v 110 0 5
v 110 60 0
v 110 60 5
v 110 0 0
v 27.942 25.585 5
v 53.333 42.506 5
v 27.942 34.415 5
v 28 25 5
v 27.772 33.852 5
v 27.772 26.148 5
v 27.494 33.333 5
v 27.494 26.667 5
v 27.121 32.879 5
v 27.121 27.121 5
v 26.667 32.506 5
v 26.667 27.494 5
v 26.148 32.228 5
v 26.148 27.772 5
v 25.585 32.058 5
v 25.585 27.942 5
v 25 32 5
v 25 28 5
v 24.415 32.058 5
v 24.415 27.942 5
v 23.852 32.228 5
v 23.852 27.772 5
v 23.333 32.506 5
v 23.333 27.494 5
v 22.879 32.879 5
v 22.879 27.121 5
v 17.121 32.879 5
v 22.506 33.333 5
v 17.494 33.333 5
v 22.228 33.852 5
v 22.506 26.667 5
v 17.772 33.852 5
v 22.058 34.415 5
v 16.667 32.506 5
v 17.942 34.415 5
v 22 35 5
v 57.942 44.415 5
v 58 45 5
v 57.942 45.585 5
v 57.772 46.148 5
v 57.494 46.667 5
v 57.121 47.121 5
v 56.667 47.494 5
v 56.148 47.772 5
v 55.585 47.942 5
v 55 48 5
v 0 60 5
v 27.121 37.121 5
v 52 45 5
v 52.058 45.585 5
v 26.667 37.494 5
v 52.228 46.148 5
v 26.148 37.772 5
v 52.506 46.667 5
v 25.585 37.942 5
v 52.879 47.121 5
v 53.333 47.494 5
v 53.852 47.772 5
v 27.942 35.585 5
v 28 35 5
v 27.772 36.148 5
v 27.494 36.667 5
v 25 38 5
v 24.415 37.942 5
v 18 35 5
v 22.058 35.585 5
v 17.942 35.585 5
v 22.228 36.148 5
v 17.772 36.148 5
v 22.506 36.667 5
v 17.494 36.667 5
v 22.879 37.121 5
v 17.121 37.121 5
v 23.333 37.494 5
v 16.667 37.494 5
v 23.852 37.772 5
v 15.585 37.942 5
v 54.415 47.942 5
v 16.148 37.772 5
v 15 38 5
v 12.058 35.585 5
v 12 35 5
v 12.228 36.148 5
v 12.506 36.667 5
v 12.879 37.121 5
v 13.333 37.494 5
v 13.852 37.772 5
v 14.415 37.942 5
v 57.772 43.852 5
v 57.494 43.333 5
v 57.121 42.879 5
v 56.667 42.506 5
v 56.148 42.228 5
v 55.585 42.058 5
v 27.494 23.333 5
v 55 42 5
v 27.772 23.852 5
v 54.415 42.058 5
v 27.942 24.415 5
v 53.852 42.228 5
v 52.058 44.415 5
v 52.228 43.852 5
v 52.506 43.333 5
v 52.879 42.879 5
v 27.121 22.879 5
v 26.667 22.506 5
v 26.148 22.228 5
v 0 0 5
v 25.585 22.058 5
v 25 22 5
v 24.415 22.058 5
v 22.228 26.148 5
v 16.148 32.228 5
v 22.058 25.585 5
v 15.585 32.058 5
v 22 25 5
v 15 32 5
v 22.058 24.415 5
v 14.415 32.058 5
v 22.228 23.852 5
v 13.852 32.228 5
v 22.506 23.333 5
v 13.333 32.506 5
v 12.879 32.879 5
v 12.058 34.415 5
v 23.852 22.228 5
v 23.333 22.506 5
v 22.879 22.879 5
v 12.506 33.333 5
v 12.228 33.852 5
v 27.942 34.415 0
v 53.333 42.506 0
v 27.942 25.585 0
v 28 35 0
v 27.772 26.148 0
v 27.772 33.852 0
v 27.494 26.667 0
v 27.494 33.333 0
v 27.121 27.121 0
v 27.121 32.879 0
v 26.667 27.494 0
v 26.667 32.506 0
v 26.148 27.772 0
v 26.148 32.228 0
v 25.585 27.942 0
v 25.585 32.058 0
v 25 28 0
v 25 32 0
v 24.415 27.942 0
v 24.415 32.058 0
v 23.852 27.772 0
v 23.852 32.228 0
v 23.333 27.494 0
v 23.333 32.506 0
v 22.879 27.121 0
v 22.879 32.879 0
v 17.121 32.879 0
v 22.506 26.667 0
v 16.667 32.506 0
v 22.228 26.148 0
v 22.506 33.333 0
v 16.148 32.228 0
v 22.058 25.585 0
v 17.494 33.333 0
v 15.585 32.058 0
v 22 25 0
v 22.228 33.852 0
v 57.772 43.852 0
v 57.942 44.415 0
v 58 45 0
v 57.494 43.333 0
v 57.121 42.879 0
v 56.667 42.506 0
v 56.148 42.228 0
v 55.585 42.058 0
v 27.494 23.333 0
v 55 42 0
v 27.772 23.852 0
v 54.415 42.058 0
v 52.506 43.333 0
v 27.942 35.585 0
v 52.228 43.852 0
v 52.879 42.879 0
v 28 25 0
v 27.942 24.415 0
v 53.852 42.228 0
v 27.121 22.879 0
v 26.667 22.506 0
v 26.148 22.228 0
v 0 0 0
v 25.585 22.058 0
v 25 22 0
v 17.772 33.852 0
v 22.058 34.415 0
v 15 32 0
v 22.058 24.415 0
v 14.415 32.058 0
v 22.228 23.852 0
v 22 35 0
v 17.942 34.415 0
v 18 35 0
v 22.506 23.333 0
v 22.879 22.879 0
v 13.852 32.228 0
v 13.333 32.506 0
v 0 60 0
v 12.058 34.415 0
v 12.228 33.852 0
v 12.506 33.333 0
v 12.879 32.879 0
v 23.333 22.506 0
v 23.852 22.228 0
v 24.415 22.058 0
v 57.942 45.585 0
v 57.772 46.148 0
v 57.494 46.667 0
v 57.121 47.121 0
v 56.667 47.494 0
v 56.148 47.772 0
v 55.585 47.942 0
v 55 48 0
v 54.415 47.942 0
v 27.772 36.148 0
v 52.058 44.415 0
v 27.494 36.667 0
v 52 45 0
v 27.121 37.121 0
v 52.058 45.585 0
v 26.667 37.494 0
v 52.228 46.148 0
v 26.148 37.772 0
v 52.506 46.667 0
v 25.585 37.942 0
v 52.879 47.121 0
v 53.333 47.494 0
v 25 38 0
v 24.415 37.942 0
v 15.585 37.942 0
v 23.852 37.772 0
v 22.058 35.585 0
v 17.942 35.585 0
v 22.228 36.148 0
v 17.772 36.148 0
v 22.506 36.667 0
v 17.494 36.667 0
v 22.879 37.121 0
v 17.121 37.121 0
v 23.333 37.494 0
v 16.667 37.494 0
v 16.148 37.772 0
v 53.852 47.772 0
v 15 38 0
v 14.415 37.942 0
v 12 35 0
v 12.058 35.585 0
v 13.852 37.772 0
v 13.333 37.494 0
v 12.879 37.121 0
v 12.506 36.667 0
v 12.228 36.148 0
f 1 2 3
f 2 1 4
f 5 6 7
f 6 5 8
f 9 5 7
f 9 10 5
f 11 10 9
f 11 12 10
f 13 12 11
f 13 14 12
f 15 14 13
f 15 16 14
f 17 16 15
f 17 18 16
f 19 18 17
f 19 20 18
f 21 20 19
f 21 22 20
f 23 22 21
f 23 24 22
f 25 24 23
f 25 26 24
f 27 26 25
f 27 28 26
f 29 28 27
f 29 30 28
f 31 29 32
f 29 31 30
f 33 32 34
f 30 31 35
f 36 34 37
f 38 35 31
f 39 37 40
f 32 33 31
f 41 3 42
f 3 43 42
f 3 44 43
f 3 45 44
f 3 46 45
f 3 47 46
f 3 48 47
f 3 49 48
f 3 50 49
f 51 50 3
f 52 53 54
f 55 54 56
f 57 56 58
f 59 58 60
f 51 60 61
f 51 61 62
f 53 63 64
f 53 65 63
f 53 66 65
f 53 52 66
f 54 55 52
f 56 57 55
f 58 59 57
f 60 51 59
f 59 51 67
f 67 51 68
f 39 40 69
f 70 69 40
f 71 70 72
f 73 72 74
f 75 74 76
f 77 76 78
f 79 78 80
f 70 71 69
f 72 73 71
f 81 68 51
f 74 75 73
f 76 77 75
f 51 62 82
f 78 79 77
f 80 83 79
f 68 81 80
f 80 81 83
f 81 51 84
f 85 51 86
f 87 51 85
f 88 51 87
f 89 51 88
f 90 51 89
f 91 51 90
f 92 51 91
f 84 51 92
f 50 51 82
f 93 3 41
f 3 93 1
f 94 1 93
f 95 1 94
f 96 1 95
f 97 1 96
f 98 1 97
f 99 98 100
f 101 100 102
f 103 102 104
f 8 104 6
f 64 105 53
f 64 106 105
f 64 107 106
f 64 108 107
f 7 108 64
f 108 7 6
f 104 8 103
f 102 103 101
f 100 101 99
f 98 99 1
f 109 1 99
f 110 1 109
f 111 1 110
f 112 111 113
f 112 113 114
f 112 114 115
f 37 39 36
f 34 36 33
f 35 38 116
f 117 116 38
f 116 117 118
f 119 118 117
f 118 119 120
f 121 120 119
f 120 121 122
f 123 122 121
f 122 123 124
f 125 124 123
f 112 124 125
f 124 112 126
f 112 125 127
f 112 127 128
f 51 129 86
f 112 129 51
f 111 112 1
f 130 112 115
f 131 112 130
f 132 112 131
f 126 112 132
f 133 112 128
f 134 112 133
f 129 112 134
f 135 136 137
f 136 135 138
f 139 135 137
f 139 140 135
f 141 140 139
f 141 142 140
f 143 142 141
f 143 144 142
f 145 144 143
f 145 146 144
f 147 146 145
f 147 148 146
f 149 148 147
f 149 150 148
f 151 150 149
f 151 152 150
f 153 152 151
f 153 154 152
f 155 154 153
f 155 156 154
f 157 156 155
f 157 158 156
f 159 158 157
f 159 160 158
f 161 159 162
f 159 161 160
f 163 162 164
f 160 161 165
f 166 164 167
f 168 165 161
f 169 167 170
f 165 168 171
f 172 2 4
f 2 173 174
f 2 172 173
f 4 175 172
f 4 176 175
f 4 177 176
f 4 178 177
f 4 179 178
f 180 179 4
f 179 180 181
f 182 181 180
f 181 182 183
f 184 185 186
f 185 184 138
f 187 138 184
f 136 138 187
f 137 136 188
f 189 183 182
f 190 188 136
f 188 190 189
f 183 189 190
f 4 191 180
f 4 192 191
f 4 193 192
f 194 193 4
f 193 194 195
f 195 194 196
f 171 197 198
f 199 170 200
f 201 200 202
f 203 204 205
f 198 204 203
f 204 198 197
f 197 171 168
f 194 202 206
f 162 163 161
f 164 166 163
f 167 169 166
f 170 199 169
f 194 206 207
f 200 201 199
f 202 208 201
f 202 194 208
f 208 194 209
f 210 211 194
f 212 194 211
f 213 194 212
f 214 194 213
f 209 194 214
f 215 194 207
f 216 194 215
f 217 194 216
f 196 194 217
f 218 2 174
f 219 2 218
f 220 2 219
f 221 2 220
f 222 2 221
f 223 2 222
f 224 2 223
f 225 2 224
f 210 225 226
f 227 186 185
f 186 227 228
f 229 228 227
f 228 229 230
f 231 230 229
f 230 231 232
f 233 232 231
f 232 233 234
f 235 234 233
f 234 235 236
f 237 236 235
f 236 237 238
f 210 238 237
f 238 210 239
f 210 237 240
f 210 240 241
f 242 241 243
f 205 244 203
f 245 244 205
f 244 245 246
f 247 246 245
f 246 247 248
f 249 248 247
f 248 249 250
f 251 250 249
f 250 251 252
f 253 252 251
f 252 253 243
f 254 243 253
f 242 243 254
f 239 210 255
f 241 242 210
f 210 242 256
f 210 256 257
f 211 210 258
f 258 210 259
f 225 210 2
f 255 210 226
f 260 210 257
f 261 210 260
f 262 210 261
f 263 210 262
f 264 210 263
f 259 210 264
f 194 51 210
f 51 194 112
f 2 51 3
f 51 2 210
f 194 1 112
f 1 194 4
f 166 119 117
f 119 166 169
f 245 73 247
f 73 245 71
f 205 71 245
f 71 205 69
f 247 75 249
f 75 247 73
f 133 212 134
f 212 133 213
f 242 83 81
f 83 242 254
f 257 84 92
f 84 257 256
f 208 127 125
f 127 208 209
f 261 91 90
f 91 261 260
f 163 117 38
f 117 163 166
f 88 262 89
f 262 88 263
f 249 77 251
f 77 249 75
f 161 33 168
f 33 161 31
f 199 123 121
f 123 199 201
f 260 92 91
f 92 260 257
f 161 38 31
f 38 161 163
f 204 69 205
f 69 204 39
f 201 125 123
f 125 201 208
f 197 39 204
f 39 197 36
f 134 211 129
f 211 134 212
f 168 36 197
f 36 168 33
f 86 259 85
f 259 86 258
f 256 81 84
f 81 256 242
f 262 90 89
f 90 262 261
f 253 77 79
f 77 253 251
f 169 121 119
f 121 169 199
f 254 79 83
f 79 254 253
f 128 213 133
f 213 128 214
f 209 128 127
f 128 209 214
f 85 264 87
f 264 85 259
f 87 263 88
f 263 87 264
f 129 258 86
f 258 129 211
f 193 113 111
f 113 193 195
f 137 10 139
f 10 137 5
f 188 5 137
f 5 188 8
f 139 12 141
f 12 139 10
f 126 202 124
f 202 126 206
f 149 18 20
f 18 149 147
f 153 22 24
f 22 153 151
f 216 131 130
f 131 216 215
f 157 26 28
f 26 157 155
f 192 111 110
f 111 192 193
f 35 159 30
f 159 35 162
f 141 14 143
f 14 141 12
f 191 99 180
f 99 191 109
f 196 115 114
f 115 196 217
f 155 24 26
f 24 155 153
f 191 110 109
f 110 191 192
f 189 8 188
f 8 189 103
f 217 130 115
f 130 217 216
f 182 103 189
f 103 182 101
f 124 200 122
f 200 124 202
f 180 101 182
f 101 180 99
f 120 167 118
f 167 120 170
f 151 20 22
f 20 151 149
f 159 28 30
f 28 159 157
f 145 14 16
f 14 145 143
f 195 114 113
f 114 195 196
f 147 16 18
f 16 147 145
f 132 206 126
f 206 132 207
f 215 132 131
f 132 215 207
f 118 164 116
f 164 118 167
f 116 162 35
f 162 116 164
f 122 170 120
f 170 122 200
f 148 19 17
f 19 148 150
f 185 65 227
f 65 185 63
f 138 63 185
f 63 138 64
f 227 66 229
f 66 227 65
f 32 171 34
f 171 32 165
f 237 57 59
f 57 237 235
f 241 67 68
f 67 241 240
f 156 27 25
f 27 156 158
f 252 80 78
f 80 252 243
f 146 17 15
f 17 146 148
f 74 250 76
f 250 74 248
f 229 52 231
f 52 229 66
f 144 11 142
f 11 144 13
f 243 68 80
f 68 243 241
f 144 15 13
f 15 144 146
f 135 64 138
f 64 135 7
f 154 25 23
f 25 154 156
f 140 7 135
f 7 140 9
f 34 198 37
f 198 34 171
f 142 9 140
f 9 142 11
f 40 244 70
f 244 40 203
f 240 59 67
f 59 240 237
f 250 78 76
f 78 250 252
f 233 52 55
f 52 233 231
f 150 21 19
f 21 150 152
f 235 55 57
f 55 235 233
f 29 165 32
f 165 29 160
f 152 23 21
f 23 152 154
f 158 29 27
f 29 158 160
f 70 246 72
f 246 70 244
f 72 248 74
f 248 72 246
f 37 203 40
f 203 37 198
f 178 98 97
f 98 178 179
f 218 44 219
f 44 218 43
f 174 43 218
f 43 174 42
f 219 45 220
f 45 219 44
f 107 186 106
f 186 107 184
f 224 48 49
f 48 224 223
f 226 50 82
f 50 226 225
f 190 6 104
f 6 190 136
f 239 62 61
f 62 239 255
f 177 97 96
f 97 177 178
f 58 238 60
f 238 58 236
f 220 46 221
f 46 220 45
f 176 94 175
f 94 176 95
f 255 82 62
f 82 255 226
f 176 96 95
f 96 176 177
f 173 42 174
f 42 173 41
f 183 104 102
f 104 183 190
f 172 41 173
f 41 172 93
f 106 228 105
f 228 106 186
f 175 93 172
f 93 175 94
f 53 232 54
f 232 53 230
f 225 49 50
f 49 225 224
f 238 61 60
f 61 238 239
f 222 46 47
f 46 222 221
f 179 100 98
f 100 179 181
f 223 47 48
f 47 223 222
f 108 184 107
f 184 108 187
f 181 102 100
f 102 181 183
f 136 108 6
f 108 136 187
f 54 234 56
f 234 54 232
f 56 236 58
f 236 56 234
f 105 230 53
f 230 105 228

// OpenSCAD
$fn = 32;

// ----------------------------------------------------------------------
// Hole field: plate with holes at given coordinates
// ----------------------------------------------------------------------

// --- parameters (mm) ---
plate_l = 110;            // plate length, X
plate_w = 60;             // plate width, Y
plate_t = 5;              // plate thickness, Z
hole_d = 6;               // hole diameter

difference() {
  cube([plate_l, plate_w, plate_t]);
  translate([15, 35, -1]) cylinder(h = plate_t + 2, d = hole_d);
  translate([25, 25, -1]) cylinder(h = plate_t + 2, d = hole_d);
  translate([25, 35, -1]) cylinder(h = plate_t + 2, d = hole_d);
  translate([55, 45, -1]) cylinder(h = plate_t + 2, d = hole_d);
}
